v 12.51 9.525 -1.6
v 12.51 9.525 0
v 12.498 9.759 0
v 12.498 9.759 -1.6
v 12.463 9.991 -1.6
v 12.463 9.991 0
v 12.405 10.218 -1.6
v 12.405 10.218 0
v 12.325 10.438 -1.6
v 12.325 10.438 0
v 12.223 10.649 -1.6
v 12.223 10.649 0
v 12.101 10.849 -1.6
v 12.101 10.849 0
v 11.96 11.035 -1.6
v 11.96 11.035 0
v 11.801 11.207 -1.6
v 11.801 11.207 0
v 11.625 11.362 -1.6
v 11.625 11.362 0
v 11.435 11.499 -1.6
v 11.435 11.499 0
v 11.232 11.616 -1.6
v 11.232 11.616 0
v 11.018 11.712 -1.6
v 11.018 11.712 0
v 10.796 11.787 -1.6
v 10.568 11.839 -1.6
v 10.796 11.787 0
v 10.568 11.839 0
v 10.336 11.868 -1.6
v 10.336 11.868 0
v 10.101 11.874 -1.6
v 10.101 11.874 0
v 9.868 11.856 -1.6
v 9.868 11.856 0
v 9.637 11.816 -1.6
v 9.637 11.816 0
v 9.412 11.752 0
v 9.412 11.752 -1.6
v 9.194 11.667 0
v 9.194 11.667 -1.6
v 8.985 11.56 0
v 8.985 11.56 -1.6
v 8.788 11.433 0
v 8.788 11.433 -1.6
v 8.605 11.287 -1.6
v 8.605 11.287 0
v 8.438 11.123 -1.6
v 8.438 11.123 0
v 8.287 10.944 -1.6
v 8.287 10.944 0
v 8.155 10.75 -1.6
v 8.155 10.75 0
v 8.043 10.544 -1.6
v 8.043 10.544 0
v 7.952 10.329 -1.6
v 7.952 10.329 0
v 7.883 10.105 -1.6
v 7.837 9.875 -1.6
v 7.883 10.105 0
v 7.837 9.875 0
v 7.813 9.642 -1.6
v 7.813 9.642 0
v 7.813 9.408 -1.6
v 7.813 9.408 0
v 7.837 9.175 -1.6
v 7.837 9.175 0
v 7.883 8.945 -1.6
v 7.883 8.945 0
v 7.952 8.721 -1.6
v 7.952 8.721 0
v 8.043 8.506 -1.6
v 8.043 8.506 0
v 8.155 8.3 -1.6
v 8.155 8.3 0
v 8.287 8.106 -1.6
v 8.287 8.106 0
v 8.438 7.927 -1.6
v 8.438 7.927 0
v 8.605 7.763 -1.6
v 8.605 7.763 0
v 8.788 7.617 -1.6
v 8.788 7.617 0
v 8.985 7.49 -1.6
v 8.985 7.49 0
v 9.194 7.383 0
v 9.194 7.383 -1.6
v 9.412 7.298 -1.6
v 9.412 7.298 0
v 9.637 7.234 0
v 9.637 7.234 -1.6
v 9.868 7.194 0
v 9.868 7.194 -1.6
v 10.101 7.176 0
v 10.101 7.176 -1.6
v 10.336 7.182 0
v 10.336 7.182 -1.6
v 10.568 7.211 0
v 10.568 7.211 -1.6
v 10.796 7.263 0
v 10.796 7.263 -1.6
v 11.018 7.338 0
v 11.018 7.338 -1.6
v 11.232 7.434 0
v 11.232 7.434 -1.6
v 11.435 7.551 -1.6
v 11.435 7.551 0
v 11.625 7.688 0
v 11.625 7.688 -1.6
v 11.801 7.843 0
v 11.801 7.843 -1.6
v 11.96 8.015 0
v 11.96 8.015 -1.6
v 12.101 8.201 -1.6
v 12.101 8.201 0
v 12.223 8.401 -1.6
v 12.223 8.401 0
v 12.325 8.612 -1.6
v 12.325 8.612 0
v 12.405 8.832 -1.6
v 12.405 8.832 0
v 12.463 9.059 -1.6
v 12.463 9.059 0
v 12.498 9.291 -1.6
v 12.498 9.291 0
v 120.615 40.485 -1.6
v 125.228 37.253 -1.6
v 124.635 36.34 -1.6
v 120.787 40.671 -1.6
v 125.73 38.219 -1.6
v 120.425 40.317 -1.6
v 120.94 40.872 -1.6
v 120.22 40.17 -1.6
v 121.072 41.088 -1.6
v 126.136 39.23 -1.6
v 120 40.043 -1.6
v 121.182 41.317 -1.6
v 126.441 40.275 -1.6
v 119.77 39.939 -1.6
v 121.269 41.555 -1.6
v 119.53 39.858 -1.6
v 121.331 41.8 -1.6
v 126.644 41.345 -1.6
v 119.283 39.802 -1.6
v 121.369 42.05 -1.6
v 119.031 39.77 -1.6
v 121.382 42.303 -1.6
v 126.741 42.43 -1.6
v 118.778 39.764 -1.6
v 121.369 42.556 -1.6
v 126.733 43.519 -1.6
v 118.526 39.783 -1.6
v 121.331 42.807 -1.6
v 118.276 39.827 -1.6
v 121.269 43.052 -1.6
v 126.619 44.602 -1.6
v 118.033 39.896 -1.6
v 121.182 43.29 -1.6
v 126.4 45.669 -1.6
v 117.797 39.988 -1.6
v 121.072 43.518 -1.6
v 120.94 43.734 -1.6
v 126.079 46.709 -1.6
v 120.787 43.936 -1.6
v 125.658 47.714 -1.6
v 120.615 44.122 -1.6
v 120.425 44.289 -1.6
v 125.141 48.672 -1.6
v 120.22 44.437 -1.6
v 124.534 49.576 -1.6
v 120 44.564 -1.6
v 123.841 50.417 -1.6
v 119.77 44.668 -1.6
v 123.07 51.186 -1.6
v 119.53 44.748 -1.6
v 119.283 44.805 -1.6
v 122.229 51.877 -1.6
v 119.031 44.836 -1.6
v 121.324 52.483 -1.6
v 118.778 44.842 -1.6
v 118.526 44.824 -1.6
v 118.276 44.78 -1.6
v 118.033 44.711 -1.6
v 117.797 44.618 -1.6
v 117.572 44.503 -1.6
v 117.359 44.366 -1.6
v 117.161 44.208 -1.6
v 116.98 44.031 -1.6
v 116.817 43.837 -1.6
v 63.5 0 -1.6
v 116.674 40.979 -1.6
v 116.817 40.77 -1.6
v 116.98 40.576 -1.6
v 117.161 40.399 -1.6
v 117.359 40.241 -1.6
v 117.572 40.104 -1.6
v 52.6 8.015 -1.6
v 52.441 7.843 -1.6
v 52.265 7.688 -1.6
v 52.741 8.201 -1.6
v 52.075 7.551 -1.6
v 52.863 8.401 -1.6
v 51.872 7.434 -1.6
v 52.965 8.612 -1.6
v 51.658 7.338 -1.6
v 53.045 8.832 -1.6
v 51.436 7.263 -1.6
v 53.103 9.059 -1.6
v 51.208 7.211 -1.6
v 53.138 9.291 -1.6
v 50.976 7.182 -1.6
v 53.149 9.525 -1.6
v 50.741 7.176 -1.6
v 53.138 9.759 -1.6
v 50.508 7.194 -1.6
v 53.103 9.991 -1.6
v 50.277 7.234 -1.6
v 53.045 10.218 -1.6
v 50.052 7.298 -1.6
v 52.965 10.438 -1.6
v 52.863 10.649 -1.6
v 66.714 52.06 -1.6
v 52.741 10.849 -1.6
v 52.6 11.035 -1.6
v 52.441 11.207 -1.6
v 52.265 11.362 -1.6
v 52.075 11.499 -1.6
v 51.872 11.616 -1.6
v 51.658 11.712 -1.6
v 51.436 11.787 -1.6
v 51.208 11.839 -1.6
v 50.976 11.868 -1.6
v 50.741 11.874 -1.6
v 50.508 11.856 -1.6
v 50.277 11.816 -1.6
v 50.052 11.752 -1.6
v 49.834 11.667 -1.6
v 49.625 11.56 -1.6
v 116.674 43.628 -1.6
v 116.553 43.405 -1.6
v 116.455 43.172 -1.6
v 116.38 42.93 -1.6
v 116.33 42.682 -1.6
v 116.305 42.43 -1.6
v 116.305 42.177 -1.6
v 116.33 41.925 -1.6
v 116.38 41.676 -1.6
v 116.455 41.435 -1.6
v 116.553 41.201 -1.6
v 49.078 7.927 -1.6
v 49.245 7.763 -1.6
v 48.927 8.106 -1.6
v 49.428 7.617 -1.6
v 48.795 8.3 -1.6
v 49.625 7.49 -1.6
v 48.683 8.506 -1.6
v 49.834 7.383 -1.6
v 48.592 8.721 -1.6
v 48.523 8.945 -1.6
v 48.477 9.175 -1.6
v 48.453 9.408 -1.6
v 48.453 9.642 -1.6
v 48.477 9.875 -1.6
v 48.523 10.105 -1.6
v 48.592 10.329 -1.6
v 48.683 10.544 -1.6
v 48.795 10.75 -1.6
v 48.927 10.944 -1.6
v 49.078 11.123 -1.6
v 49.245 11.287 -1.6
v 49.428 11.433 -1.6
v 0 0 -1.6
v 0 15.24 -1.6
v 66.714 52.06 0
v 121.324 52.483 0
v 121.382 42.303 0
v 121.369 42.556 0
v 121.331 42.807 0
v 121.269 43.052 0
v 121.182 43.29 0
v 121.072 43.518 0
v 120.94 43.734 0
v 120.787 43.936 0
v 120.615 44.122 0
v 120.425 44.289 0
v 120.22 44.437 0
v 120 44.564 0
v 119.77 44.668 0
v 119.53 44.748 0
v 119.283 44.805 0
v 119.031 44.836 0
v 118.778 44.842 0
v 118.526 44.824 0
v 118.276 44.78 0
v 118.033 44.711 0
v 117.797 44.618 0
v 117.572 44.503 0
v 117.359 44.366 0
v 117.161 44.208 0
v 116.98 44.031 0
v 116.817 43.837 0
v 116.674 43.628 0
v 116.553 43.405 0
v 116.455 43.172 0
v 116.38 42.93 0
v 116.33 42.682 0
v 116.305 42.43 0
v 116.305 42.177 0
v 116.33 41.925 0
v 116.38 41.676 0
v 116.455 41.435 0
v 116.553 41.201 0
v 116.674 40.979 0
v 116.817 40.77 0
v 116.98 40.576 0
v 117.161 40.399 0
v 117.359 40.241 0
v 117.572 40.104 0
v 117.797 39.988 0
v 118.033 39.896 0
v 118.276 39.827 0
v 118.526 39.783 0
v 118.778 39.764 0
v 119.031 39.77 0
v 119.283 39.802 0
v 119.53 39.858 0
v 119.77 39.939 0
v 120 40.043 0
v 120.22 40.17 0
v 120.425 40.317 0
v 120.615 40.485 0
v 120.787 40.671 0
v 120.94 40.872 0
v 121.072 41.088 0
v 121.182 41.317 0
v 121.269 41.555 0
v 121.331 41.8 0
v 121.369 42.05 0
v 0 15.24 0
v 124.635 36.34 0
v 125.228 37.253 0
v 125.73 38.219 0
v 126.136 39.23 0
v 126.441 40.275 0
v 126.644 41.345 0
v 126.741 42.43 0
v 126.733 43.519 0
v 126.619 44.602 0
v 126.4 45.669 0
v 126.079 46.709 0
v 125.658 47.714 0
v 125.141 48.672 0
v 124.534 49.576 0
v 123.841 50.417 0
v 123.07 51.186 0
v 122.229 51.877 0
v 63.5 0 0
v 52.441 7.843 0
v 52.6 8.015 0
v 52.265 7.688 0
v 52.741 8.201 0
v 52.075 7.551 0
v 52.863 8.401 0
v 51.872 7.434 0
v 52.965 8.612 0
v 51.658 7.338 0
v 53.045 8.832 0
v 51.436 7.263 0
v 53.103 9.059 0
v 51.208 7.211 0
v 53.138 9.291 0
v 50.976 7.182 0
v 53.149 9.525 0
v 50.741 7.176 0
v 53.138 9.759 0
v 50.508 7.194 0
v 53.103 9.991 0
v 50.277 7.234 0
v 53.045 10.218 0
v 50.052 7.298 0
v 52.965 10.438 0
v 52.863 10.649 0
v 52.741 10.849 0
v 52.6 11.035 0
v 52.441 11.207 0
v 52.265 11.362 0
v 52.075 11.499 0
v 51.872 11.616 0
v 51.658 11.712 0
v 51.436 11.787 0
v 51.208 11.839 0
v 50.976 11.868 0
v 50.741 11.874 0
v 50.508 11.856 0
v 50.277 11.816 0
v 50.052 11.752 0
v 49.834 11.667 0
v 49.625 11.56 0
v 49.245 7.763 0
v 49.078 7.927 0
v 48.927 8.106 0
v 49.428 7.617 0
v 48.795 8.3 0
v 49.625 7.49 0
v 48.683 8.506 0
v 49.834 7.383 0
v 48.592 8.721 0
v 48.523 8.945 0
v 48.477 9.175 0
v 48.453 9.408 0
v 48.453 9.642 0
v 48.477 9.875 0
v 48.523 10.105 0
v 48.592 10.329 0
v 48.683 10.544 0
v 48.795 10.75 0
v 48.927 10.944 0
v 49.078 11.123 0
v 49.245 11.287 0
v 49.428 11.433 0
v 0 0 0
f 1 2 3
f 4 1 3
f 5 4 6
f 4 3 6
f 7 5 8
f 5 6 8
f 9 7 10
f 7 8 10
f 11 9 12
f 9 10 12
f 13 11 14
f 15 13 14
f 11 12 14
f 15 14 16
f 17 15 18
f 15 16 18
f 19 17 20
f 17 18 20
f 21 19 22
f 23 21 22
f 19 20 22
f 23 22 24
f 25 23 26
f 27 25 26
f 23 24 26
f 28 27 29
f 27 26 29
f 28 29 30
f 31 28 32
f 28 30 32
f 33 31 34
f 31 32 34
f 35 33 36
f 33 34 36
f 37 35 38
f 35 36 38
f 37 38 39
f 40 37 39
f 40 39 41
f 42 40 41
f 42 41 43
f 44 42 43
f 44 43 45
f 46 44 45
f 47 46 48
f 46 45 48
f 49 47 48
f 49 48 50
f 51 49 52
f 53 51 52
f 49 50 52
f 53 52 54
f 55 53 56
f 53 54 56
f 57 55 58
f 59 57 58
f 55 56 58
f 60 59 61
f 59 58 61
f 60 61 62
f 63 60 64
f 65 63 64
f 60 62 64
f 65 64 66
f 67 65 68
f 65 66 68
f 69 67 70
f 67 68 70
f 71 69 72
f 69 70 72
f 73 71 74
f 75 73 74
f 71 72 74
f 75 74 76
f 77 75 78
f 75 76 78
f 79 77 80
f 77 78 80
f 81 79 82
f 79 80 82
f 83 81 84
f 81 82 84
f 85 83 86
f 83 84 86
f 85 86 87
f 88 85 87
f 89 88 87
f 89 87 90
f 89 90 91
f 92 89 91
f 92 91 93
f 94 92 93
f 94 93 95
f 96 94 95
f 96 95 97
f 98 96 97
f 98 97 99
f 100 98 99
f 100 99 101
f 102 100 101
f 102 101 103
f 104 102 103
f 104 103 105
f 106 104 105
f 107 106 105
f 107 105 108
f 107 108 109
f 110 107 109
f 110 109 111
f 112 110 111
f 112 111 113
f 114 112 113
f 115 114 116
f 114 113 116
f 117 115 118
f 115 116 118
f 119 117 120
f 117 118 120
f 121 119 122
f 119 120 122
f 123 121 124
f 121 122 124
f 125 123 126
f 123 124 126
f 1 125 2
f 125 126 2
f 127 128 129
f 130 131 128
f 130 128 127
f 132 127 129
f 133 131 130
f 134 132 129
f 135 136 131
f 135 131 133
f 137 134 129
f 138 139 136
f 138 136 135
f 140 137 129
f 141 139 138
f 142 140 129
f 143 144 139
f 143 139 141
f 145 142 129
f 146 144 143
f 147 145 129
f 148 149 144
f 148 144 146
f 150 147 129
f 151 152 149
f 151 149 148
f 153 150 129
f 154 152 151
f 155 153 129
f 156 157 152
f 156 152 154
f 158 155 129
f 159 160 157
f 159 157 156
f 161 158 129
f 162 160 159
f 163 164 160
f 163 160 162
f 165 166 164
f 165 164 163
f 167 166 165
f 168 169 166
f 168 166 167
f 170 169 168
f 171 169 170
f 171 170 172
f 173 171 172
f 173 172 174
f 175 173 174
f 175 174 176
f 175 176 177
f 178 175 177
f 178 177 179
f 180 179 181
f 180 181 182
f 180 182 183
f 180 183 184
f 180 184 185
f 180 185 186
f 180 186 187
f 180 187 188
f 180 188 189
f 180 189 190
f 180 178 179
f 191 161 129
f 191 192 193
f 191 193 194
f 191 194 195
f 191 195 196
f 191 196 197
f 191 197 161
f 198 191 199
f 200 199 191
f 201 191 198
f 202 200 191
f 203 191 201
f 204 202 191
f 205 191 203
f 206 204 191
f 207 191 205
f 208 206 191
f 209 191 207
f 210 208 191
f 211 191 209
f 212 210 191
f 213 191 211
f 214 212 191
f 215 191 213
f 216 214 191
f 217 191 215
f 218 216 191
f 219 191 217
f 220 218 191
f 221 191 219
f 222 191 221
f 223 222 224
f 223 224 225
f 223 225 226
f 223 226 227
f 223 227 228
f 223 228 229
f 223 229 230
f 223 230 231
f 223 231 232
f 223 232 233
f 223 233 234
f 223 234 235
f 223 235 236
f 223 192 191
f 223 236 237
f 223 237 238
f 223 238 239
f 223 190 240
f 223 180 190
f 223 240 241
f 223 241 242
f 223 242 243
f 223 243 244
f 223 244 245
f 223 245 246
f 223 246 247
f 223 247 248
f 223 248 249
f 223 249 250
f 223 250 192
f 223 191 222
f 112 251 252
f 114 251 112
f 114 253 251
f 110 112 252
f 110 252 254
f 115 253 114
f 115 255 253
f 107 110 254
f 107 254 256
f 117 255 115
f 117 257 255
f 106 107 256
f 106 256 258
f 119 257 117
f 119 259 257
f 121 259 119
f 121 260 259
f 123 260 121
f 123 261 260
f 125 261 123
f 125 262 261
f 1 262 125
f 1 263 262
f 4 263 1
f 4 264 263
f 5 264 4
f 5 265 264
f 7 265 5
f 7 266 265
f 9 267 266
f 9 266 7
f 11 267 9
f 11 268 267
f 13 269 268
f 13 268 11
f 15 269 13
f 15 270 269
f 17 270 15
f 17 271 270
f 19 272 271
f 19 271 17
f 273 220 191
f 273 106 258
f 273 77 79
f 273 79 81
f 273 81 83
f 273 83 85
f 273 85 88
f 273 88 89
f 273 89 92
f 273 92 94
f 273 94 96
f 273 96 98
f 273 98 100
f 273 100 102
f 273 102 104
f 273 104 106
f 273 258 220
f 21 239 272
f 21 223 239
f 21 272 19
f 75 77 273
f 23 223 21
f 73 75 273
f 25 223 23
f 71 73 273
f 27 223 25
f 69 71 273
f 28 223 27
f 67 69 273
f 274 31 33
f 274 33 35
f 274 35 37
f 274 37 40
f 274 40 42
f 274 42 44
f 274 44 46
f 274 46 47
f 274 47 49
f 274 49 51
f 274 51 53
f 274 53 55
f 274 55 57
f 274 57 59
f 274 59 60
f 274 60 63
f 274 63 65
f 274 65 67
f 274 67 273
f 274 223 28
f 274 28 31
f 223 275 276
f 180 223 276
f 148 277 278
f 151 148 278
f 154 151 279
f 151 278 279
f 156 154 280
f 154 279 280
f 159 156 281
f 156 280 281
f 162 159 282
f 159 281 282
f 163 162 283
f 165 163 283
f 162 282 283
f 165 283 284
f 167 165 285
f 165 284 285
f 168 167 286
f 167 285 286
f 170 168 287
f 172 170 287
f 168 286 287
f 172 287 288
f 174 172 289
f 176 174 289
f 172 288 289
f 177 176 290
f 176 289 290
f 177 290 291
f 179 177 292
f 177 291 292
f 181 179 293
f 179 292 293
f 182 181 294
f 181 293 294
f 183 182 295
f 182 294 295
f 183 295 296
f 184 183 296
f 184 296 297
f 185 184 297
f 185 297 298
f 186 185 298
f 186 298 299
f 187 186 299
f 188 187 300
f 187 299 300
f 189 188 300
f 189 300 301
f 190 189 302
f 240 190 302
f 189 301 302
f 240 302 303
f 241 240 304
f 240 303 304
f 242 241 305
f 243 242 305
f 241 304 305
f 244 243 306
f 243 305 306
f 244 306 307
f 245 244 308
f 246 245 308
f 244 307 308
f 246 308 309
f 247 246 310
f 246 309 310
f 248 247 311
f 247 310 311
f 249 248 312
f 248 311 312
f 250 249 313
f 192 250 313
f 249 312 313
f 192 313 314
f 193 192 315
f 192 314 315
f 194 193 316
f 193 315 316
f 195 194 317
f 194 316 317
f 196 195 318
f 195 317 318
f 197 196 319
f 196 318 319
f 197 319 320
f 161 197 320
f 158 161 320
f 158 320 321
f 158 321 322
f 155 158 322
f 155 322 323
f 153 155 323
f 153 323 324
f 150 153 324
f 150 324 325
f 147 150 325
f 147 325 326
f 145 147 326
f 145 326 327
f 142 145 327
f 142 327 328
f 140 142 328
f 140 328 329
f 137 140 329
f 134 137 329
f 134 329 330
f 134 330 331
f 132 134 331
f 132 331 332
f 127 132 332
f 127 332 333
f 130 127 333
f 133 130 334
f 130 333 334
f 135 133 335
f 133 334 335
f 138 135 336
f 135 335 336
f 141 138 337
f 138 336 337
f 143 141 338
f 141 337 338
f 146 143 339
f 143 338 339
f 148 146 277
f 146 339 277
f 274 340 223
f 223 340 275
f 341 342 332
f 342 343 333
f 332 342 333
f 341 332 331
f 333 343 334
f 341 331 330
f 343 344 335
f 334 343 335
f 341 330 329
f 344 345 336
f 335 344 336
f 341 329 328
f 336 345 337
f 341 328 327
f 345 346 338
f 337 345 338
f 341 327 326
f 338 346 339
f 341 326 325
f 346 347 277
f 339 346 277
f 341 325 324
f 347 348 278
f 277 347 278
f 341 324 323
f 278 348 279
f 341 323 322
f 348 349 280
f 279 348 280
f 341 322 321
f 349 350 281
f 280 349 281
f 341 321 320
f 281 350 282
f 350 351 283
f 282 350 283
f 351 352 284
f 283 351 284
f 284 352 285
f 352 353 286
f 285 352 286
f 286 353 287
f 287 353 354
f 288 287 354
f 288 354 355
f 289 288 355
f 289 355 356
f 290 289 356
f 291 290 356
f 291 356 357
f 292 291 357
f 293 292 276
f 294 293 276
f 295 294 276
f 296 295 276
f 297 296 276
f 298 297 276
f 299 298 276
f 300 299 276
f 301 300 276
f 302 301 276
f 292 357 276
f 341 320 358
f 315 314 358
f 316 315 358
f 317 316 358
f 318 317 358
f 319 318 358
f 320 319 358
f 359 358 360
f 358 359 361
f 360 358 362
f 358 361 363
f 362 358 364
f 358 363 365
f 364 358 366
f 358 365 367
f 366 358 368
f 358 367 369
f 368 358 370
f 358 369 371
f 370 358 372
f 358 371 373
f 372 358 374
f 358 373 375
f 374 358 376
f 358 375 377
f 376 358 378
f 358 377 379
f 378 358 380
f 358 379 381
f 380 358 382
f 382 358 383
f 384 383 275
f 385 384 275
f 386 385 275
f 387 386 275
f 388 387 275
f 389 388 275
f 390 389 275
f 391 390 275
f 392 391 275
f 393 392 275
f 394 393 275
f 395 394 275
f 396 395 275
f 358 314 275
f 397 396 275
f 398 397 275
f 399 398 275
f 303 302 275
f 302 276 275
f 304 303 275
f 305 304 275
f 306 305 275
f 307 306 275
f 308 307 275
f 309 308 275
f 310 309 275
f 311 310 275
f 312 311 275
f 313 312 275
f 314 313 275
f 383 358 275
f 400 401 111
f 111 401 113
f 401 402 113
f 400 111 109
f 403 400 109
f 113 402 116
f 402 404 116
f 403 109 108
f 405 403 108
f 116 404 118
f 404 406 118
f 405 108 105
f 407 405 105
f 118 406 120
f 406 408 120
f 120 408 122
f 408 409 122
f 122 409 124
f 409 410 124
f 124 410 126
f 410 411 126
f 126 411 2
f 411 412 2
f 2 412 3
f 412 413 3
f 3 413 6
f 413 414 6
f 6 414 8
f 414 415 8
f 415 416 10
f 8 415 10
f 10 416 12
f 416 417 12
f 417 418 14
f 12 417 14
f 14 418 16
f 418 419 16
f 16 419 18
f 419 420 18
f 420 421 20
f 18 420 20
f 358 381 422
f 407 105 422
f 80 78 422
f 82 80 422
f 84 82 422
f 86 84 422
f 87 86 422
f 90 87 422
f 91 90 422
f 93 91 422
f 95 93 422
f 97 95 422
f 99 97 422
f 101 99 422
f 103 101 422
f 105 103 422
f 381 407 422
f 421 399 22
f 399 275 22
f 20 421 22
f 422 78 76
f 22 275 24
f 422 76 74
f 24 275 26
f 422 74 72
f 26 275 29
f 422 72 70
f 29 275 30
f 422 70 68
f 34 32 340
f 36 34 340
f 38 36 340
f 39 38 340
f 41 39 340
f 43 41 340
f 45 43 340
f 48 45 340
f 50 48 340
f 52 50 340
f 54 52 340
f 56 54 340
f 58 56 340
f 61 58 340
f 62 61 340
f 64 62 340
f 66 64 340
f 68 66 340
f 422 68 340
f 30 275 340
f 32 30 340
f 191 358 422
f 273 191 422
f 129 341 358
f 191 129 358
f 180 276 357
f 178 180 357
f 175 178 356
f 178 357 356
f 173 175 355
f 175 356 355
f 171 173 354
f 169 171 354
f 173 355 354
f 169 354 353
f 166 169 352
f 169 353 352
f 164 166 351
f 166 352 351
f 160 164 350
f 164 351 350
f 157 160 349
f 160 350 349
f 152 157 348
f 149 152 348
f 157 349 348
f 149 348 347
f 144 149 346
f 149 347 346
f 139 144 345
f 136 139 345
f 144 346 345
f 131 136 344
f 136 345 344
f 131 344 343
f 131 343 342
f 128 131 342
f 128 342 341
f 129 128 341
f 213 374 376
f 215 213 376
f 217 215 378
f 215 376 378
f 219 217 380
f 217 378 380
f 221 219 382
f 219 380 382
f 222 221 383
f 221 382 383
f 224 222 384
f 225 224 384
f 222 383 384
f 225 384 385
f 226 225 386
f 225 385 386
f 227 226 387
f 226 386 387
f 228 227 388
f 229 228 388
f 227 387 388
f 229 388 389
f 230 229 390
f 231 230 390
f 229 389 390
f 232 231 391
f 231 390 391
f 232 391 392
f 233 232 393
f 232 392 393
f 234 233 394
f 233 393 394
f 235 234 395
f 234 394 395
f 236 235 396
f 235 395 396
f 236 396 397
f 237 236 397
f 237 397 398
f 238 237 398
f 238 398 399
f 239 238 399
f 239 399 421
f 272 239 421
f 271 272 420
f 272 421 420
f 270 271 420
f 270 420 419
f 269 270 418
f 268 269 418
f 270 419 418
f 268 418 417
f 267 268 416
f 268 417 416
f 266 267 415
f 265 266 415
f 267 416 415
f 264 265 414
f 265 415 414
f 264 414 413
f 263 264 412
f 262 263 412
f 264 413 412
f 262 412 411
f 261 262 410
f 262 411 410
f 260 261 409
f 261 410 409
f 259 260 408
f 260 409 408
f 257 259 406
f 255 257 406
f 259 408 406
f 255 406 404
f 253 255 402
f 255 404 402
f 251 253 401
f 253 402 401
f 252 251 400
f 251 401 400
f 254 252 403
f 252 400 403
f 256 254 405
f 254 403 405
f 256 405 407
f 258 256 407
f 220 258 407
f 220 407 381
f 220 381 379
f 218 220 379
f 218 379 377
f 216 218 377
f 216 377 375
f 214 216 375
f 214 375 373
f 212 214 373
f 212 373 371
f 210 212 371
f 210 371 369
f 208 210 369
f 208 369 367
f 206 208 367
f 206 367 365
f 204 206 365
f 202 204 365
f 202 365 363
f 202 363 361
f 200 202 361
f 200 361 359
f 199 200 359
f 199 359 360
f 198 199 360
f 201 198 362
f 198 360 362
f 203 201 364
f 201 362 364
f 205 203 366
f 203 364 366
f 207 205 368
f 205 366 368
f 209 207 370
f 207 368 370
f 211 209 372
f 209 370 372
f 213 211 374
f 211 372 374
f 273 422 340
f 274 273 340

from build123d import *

# Parameters (mm, degrees)
SKETCH1_R           = 2.3495
SKETCH1_R_2         = 2.54
BOSS_EXTRUDE1_DEPTH = 1.6002


with BuildPart() as part:
    # Sketch1 → Boss-Extrude1 (new body)
    with BuildSketch(Plane.XY):
        with BuildLine():
            Line((0, 0), (0, 15.24))
            Line((0, 15.24), (66.713584346, 52.060343069))
            Line((66.713584346, 52.060343069), (121.323584346, 52.482745441))
            ThreePointArc((121.323584346, 52.482745441), (126.52255489, 45.138126941), (124.63483314, 36.339875852))
            Line((124.63483314, 36.339875852), (63.5, 0))
            Line((63.5, 0), (0, 0))
        make_face()
        with Locations((10.16, 9.525)):
            Circle(SKETCH1_R, mode=Mode.SUBTRACT)
        with Locations((50.8, 9.525)):
            Circle(SKETCH1_R, mode=Mode.SUBTRACT)
        with Locations((118.841606936, 42.303243693)):
            Circle(SKETCH1_R_2, mode=Mode.SUBTRACT)
    extrude(amount=-BOSS_EXTRUDE1_DEPTH)


solid = part.part
